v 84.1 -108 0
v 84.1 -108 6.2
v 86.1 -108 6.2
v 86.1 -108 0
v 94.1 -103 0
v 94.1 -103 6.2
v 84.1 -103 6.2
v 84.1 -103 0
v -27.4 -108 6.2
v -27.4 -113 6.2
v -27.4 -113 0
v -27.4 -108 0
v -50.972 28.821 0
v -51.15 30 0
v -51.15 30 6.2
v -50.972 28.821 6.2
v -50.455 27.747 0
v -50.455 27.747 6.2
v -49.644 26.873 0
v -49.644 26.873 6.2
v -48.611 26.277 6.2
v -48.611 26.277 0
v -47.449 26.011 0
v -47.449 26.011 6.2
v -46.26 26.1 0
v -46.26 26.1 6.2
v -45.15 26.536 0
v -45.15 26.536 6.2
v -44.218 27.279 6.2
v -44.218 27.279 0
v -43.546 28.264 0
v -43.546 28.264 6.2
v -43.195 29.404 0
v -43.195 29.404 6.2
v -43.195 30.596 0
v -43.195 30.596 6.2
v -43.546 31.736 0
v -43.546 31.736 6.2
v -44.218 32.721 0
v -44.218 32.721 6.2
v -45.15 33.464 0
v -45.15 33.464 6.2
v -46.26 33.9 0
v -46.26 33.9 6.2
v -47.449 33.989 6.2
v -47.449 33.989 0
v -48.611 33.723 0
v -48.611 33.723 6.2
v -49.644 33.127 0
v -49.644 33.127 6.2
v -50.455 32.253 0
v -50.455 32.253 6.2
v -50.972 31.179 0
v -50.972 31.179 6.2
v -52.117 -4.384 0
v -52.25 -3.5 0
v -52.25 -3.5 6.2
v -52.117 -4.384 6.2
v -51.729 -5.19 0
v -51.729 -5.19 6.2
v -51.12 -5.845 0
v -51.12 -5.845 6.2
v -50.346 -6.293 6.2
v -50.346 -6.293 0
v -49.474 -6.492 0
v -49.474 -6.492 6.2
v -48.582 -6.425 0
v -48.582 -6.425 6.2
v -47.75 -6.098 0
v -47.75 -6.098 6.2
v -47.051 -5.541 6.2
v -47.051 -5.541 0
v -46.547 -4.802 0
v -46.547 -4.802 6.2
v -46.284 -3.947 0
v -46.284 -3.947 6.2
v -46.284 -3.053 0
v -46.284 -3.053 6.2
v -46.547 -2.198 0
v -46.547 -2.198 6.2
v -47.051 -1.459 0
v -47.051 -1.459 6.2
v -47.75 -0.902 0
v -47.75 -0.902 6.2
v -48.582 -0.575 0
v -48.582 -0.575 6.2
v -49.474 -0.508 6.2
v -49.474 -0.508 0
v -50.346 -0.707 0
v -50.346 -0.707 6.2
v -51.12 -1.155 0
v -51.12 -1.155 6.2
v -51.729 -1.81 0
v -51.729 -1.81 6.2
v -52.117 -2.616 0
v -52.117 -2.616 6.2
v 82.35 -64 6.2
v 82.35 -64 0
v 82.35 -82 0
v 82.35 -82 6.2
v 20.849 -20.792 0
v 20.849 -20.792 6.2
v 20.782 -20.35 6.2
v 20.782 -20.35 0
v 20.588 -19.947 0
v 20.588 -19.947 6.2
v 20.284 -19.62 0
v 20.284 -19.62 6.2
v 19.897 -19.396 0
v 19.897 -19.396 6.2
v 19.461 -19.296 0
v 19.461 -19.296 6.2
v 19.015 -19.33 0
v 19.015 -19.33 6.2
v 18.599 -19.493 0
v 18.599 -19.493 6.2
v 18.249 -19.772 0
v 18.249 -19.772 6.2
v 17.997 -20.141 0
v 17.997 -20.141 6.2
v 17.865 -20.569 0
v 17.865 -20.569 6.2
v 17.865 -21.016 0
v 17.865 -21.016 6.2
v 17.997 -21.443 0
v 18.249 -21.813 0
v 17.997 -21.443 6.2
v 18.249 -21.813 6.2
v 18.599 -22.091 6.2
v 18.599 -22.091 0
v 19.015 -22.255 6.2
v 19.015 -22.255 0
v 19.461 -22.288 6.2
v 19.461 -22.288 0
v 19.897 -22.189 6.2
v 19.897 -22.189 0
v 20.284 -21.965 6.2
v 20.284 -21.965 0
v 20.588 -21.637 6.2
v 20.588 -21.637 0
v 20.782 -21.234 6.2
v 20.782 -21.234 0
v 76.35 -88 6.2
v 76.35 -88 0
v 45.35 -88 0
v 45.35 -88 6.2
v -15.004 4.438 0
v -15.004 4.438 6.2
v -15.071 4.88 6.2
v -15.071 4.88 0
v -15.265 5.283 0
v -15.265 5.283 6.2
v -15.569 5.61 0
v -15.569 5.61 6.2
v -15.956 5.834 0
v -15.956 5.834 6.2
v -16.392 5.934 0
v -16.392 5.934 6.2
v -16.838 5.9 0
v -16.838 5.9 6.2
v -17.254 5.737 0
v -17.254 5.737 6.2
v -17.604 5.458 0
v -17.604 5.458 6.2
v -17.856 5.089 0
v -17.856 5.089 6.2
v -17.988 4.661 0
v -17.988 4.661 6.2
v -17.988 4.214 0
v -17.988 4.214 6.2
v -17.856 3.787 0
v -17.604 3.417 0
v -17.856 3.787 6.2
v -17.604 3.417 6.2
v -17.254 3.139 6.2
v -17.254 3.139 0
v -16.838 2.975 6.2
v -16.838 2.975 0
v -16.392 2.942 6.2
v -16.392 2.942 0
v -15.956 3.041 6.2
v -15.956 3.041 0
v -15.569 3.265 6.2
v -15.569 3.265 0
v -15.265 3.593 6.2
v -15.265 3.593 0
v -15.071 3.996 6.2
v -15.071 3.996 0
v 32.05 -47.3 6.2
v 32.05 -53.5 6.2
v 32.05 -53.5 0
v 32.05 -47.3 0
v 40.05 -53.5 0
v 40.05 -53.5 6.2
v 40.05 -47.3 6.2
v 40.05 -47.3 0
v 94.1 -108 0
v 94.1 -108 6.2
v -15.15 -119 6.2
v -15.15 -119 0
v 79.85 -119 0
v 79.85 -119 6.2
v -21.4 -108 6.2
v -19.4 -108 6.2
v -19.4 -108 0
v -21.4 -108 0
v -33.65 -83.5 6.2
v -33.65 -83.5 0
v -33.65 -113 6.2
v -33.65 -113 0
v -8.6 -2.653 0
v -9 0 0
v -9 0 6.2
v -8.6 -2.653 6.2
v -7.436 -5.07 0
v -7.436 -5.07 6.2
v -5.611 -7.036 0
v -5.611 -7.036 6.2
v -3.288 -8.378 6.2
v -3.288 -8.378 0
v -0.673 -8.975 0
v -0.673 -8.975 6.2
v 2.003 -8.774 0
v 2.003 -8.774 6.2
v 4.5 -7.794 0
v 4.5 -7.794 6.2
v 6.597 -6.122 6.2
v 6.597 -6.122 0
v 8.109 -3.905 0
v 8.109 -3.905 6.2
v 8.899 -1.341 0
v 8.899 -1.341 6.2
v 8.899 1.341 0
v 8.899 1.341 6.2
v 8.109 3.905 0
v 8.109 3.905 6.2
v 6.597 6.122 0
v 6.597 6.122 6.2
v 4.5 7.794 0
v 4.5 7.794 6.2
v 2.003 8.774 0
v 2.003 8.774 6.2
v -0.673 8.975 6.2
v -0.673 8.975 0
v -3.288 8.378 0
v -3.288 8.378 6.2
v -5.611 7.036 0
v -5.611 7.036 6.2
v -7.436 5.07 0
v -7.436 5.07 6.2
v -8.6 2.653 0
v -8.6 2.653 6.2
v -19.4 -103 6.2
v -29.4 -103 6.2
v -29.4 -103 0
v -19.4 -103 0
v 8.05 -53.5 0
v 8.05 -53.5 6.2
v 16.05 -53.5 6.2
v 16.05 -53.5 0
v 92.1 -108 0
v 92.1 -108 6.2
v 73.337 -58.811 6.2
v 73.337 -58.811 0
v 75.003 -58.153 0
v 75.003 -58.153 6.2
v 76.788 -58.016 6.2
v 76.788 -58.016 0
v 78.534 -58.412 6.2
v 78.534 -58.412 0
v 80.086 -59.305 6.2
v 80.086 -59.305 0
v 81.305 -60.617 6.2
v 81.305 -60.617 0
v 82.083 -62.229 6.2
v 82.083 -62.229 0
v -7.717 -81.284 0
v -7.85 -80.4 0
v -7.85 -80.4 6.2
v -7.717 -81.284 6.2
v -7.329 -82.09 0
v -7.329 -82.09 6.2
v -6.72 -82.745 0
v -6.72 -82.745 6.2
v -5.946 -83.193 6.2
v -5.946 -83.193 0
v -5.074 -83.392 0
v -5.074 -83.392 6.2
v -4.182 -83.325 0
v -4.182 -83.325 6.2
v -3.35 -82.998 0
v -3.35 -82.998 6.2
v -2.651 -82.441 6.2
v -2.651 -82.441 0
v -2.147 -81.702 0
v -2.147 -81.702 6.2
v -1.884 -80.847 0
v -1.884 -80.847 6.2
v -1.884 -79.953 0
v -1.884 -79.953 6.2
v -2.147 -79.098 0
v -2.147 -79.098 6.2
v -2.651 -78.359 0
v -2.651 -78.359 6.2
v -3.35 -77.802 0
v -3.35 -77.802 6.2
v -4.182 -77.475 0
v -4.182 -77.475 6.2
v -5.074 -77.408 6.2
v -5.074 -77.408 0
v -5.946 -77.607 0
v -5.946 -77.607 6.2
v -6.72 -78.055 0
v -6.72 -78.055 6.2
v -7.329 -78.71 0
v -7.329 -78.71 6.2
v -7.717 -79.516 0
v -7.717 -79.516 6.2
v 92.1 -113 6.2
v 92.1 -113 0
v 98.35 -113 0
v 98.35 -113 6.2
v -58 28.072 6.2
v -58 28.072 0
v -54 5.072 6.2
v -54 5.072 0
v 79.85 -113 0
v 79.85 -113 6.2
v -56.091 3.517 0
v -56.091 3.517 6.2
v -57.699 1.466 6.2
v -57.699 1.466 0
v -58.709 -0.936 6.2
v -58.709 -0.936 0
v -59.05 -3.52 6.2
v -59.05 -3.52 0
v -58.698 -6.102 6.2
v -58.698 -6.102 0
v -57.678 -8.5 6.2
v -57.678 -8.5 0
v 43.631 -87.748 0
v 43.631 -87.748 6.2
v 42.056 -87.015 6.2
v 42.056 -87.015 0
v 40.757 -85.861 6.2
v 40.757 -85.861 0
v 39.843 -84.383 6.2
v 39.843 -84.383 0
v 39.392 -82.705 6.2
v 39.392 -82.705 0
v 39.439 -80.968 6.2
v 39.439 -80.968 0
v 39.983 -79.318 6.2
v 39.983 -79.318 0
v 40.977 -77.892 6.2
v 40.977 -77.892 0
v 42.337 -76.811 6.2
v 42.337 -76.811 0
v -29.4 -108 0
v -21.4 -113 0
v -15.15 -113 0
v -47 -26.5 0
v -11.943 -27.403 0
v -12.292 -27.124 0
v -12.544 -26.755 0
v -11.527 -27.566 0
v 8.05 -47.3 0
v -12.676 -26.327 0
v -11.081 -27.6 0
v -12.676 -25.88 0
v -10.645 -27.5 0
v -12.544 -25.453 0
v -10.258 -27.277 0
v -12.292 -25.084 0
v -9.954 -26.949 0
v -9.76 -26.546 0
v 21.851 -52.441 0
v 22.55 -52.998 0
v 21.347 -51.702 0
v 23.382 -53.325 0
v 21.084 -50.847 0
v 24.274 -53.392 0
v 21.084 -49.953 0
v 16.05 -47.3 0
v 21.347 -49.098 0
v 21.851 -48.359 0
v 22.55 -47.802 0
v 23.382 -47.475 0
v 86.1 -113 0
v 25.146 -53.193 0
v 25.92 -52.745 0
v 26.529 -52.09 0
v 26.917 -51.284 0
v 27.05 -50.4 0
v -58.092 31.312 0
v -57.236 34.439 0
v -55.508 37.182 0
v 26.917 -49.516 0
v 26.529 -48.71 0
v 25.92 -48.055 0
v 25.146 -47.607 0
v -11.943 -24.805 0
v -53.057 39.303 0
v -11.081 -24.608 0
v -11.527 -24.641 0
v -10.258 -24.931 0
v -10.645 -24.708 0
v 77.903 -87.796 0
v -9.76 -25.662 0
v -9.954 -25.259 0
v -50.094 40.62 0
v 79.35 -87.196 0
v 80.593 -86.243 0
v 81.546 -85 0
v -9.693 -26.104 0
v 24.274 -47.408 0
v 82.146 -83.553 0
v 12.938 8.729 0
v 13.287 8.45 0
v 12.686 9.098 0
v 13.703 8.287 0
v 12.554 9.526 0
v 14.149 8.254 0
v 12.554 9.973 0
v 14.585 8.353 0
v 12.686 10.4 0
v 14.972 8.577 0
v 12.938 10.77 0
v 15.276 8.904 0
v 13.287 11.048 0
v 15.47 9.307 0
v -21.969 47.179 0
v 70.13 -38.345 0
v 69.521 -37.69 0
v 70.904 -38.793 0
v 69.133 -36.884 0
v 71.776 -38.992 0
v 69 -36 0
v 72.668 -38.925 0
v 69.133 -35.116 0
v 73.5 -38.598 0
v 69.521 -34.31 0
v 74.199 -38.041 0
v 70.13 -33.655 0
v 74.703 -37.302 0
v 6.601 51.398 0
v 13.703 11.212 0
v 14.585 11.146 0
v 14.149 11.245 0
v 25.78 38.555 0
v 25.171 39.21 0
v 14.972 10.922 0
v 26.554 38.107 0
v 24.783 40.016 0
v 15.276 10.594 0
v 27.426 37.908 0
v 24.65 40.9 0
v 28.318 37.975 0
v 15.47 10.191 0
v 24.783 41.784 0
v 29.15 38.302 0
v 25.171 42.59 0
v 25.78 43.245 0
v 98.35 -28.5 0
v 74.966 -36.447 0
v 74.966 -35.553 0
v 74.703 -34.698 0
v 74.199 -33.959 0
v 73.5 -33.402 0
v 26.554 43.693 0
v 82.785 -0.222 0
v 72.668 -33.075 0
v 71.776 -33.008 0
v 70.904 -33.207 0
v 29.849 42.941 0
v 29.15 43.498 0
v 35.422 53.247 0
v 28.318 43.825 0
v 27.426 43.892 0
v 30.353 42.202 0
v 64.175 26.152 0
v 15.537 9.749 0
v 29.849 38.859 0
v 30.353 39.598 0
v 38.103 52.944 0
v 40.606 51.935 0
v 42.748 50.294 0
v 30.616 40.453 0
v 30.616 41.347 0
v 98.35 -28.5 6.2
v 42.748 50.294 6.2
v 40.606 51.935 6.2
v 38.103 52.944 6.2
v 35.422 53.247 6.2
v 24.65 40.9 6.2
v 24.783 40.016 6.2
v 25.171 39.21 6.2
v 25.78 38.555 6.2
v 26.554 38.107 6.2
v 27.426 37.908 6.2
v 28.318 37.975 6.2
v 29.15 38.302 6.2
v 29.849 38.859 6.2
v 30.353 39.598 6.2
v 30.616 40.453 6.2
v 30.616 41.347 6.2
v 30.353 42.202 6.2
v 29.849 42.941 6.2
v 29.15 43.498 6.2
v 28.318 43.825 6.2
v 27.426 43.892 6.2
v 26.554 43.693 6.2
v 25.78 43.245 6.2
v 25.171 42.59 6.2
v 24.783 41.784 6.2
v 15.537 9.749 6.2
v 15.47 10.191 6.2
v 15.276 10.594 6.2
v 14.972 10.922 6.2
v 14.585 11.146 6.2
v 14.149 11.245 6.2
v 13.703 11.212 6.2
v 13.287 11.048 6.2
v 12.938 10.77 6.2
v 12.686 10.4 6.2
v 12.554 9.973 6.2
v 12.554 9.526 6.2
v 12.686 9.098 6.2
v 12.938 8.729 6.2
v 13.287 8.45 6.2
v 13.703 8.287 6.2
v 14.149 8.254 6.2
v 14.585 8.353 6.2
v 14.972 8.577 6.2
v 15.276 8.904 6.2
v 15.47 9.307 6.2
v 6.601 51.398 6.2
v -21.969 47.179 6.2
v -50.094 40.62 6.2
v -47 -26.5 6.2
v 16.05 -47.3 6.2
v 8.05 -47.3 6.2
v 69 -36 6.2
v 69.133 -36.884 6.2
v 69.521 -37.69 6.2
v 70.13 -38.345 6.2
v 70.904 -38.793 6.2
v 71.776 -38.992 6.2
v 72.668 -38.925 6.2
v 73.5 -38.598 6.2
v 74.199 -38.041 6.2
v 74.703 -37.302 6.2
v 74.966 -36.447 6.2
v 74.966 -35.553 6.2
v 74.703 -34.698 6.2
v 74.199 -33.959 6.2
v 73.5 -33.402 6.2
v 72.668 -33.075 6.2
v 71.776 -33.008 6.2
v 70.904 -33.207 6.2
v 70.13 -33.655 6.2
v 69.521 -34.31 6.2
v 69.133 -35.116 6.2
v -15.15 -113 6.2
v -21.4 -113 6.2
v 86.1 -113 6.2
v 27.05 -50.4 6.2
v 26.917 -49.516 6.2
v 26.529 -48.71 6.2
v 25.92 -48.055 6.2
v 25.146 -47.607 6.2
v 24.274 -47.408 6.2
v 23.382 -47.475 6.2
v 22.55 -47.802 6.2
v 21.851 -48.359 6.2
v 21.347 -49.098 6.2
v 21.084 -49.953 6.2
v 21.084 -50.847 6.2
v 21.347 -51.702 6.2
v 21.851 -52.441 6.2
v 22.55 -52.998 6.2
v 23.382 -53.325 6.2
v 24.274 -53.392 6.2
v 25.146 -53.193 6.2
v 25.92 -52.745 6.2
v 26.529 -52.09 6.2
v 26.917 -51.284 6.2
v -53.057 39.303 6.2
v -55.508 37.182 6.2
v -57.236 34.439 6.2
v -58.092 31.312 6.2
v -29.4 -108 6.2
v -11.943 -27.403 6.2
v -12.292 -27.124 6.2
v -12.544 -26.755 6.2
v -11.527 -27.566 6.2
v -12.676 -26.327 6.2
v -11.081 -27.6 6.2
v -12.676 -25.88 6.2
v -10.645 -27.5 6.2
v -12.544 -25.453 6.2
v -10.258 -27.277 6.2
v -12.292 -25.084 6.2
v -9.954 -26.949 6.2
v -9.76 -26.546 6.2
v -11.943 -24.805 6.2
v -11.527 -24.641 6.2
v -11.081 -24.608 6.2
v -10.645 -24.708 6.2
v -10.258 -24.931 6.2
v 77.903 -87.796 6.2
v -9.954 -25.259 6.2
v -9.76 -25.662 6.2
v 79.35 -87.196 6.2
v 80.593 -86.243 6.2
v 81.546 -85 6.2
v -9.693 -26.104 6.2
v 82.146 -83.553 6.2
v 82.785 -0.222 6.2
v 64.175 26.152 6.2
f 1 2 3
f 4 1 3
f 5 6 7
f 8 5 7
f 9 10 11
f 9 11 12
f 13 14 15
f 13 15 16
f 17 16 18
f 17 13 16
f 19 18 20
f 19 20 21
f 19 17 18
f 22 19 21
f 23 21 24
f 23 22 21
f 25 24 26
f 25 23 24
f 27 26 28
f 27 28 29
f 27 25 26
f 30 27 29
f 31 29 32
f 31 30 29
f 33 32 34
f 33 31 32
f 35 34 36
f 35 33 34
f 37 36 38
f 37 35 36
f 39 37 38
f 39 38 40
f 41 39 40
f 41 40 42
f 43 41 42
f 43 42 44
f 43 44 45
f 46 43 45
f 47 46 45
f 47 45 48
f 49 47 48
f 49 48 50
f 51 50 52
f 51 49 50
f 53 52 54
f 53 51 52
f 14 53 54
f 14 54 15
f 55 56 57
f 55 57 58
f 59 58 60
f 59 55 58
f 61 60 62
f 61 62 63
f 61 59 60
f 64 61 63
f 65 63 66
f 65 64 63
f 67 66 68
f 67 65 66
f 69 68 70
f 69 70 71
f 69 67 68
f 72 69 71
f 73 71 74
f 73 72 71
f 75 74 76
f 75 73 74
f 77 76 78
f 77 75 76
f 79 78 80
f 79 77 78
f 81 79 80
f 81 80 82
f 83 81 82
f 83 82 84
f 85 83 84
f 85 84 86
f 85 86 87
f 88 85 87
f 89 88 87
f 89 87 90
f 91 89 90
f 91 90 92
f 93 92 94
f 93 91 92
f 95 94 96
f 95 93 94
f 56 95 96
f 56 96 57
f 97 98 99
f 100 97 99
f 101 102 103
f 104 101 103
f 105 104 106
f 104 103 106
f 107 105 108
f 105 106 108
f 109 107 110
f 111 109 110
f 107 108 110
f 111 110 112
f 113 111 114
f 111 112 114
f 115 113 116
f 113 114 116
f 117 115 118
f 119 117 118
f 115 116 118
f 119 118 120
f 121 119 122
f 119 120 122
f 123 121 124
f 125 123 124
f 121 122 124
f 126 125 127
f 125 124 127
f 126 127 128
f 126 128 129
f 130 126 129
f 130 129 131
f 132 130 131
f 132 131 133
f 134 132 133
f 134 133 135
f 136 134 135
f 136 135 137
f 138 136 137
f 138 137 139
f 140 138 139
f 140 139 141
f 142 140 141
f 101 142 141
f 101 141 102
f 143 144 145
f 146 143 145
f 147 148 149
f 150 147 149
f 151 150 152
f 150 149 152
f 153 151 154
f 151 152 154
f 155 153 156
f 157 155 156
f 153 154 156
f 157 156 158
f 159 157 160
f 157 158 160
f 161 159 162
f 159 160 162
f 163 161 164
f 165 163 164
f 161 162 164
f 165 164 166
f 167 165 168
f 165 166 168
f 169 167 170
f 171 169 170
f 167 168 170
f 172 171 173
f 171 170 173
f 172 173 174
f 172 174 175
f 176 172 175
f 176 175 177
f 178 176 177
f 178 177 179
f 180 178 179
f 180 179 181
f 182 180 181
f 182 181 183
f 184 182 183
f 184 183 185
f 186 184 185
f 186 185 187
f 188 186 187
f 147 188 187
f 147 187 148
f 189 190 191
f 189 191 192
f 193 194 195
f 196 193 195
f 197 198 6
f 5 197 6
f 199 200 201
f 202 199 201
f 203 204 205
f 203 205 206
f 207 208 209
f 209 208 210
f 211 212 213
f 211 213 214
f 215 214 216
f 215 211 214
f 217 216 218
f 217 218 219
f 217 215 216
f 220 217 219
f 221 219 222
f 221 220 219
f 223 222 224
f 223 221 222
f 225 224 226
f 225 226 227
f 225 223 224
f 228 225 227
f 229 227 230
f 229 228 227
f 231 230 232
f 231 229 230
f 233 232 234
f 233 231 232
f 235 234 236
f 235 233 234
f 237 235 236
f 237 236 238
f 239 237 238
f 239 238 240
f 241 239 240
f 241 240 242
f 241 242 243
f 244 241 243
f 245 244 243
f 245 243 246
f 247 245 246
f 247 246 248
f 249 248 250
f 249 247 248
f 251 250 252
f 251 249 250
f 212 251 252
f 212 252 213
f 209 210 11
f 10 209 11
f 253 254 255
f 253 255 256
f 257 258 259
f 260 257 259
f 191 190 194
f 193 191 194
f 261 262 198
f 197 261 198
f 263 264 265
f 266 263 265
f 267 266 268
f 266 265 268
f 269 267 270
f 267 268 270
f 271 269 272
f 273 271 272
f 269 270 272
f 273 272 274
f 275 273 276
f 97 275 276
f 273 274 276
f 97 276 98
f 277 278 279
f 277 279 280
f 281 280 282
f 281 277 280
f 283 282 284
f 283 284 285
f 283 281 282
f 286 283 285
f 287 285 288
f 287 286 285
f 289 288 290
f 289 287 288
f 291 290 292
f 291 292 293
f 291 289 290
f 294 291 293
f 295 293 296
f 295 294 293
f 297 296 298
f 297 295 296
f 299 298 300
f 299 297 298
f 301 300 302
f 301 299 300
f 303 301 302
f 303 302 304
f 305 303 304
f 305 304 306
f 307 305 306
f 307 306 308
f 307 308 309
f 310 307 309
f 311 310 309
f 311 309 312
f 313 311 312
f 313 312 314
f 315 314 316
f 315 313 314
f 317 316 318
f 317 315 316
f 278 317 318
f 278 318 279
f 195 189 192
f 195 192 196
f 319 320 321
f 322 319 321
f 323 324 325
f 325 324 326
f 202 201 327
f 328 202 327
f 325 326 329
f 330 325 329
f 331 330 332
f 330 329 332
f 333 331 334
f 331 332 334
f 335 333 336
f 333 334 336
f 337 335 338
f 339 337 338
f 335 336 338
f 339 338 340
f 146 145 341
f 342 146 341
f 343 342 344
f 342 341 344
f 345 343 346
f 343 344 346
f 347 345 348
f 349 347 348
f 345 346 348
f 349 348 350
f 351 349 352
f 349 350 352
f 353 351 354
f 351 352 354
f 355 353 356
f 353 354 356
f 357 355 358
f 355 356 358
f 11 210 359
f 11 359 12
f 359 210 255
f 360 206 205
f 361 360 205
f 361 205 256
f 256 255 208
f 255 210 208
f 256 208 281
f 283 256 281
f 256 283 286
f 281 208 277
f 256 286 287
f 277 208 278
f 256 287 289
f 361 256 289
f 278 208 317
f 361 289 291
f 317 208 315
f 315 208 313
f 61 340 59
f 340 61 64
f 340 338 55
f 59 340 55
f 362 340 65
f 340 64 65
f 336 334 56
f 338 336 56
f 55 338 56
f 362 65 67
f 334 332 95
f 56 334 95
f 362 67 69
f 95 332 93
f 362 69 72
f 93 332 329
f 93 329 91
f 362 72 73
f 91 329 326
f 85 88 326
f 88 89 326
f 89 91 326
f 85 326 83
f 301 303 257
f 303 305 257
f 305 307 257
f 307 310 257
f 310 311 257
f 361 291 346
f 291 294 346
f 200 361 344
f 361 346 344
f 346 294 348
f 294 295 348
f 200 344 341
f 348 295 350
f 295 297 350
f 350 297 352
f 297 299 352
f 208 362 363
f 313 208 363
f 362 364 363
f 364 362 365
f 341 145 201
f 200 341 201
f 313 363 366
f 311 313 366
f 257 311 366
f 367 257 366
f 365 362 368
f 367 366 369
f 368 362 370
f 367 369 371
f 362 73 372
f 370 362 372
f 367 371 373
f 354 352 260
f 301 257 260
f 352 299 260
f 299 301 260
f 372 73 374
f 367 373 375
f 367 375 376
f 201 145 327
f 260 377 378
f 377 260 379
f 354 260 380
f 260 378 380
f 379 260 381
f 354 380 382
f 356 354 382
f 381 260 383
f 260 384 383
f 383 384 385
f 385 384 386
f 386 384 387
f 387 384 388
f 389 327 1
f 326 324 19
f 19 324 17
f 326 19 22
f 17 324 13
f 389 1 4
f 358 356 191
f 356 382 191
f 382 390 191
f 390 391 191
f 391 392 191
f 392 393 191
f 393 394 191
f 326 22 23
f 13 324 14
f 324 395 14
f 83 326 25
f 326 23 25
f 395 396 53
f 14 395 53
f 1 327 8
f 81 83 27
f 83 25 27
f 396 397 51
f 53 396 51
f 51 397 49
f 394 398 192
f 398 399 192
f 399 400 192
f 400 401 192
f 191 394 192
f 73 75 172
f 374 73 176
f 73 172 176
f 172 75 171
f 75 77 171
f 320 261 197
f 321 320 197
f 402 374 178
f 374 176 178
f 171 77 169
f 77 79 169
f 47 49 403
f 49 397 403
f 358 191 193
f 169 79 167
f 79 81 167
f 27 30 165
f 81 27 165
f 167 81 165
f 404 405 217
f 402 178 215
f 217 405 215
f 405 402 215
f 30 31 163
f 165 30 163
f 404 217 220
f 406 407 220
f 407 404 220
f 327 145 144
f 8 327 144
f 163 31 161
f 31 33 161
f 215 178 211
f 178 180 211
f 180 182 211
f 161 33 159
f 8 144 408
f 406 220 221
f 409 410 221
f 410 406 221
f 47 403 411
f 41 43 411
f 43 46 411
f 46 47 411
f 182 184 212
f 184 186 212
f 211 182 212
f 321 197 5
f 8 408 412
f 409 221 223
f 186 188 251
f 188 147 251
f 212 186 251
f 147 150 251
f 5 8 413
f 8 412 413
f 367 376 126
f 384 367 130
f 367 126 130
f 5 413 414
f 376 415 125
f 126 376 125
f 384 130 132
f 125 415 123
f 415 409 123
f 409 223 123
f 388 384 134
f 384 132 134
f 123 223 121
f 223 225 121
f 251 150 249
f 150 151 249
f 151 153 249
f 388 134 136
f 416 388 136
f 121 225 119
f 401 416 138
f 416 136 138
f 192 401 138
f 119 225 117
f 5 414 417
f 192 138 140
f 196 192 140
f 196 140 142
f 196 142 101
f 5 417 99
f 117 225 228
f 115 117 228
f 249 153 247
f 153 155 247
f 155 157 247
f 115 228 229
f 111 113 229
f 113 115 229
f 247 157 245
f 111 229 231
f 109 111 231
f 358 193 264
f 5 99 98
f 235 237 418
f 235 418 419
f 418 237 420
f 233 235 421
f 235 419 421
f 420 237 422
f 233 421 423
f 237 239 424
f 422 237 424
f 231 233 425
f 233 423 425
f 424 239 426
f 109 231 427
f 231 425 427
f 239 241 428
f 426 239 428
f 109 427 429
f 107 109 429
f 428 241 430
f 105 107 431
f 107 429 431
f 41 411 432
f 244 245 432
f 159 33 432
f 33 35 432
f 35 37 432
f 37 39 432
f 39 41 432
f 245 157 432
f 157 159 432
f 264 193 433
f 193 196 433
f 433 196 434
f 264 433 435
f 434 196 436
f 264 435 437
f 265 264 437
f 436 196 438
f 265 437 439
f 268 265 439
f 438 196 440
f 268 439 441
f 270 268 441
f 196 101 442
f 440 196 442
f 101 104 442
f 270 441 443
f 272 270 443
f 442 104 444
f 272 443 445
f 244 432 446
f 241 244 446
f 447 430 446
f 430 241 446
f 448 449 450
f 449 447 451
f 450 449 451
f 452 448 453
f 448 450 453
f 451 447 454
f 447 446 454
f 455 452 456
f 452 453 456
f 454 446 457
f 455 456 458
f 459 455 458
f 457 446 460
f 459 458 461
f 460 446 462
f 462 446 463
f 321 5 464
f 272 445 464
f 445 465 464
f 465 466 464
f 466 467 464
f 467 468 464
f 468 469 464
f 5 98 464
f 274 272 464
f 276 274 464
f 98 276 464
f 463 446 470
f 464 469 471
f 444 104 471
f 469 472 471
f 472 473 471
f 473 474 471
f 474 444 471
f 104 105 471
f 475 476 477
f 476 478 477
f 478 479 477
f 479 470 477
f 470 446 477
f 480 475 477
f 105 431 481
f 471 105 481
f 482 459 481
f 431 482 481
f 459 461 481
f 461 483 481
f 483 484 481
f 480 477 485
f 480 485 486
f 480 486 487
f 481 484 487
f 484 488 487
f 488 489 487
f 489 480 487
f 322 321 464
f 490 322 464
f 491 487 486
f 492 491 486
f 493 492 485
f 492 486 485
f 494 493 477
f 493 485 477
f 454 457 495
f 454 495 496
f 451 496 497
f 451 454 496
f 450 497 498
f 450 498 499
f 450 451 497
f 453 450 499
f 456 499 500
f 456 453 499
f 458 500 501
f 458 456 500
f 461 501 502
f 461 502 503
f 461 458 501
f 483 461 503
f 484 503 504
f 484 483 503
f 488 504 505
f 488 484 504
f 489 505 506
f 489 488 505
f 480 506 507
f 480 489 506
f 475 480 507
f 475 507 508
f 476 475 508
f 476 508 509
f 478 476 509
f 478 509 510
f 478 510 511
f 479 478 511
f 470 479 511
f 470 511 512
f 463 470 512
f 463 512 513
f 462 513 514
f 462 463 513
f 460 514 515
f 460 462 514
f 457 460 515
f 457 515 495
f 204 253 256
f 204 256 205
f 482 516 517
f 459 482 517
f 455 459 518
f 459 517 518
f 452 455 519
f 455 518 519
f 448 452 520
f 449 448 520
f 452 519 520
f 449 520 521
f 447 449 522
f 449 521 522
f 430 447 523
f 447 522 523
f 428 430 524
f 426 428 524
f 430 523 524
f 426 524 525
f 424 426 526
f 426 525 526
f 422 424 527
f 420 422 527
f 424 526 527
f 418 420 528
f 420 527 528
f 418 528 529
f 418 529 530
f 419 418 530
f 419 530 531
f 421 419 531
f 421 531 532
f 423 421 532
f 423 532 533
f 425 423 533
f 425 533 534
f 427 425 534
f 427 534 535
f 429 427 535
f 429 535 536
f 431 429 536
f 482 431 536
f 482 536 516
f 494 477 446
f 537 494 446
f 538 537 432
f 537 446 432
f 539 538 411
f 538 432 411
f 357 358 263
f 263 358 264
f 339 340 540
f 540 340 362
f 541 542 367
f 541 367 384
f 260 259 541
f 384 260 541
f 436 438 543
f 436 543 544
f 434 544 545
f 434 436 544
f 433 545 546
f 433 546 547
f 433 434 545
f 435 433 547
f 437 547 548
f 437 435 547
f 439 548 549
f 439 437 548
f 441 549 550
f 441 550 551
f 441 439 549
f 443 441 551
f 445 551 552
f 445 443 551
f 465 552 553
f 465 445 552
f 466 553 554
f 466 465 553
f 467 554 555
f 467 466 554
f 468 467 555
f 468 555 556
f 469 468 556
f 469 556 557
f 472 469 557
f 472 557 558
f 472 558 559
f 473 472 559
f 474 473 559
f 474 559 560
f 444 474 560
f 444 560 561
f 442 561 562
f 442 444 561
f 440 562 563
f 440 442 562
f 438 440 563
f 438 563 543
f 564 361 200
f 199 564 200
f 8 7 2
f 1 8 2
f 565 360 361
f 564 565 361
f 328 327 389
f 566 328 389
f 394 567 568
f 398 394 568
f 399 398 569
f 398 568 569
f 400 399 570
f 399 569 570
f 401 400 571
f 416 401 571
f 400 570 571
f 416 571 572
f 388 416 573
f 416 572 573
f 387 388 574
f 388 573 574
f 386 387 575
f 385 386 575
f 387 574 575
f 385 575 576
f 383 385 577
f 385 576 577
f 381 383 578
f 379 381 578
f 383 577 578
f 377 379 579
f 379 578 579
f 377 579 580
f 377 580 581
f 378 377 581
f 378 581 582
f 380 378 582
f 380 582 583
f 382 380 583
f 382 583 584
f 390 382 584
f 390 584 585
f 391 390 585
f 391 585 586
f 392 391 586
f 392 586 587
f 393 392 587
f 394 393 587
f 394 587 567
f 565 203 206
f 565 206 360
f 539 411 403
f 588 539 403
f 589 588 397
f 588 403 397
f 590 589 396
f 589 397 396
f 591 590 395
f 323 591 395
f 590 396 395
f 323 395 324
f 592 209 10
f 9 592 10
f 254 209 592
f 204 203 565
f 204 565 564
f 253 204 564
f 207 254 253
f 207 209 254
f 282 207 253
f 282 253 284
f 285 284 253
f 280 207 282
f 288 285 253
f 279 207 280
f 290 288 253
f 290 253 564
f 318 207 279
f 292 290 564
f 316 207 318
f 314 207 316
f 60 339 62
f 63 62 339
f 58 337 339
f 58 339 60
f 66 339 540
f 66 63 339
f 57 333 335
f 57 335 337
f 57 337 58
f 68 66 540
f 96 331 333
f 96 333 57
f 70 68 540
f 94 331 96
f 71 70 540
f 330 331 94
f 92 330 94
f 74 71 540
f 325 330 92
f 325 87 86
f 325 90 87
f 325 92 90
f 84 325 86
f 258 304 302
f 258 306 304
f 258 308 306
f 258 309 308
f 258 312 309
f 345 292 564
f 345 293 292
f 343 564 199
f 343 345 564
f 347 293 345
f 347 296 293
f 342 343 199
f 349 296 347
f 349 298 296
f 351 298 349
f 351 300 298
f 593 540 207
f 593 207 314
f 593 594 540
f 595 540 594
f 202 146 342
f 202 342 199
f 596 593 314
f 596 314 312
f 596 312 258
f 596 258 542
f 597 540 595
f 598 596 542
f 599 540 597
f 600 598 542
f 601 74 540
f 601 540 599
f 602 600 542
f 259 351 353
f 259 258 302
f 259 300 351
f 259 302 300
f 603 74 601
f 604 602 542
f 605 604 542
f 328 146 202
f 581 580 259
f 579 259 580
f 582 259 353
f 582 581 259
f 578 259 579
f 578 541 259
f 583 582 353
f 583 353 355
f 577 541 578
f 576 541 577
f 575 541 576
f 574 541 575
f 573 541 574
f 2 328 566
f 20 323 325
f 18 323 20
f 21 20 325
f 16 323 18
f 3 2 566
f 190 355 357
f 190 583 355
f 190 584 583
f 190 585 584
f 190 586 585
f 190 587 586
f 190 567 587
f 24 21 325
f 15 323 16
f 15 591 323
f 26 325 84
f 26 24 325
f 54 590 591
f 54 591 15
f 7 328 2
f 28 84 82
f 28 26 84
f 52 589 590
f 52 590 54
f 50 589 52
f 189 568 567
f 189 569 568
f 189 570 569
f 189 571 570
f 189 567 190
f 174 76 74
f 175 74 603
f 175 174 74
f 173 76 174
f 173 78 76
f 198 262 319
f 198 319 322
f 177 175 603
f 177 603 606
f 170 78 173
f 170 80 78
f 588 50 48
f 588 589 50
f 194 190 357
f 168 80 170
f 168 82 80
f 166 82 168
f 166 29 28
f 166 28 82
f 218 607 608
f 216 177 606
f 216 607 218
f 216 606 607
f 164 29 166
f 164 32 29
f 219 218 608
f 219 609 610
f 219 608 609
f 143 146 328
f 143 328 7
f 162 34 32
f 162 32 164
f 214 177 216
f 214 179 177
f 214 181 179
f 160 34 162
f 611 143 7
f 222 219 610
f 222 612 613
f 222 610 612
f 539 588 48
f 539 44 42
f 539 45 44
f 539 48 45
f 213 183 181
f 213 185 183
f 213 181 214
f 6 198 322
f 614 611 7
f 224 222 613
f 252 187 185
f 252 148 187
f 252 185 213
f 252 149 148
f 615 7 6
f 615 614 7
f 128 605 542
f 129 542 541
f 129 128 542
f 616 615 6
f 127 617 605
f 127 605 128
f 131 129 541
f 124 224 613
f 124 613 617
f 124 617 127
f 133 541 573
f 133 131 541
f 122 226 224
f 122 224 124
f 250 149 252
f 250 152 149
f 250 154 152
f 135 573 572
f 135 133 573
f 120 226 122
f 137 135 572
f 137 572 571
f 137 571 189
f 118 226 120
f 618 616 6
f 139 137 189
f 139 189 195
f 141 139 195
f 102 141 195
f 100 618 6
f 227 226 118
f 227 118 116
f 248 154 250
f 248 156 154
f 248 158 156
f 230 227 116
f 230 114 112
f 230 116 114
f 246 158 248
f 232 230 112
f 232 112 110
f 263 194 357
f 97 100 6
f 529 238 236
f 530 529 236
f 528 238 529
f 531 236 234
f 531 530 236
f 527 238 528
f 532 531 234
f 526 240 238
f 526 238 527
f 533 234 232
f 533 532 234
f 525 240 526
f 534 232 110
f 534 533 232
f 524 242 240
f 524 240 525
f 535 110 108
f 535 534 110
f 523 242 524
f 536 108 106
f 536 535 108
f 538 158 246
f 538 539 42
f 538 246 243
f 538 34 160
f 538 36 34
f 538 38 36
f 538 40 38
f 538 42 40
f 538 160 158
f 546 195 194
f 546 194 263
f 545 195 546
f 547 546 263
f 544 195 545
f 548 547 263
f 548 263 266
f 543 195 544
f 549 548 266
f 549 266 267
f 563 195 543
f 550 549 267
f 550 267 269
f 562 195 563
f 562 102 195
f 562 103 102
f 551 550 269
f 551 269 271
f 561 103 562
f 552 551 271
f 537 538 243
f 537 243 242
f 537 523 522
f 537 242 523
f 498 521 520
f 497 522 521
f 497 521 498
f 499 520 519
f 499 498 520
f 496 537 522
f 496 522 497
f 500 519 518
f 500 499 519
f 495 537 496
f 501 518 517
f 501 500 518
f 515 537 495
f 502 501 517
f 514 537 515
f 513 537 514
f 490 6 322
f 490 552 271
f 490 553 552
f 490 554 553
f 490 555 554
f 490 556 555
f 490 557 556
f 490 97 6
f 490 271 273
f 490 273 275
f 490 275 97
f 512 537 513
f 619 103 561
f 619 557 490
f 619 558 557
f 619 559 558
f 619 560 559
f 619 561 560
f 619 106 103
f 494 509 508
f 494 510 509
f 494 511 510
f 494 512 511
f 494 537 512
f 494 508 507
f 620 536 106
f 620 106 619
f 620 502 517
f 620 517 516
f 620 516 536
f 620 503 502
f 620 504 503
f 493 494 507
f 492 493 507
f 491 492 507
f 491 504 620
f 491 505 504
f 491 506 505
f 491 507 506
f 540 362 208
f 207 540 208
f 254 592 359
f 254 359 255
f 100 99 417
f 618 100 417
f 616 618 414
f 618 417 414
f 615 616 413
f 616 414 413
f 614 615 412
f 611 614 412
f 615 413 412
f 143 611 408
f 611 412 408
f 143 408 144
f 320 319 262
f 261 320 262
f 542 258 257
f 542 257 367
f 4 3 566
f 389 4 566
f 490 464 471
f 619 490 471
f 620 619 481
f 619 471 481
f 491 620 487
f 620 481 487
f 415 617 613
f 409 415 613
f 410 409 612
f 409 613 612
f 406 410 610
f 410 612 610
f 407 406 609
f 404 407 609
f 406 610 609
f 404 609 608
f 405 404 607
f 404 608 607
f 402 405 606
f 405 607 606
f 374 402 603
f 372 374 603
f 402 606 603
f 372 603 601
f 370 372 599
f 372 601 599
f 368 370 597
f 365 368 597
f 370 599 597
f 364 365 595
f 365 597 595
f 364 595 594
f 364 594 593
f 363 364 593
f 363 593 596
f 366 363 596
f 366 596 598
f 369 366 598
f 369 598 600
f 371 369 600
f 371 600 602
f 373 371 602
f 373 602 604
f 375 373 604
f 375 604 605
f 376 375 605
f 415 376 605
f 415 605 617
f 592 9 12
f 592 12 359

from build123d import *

# Parameters (mm, degrees)
SKETCH1_R           = 4
SKETCH1_R_2         = 3
SKETCH1_R_3         = 9
BOSS_EXTRUDE1_DEPTH = 6.2
CUT_EXTRUDE1_REACH  = 156.506
SKETCH2_R           = 1.5
CUT_EXTRUDE2_REACH  = 156.506
CUT_EXTRUDE3_REACH  = 156.506
SKETCH5_R           = 3
SKETCH5_W           = 8
SKETCH5_H           = 6.2


with BuildPart() as part:
    # Sketch1 → Boss-Extrude1 (new body)
    with BuildSketch(Plane.XY):
        with BuildLine():
            Line((-57.678304402, -8.5), (-47, -26.5))
            Line((-47, -26.5), (-33.65, -83.5))
            Line((-33.65, -83.5), (-33.65, -113))
            Line((-33.65, -113), (-15.15, -113))
            Line((-15.15, -113), (-15.15, -119))
            Line((-15.15, -119), (79.85, -119))
            Line((79.85, -119), (79.85, -113))
            Line((79.85, -113), (98.35, -113))
            Line((98.35, -113), (98.35, -28.5))
            ThreePointArc((98.35, -28.5), (73.847295802, 13.224376921), (42.748141943, 50.293889619))
            ThreePointArc((42.748141943, 50.293889619), (39.389057397, 52.524667098), (35.422008956, 53.247400666))
            ThreePointArc((35.422008956, 53.247400666), (-7.727235636, 49.583712908), (-50.093777716, 40.619560464))
            ThreePointArc((-50.093777716, 40.619560464), (-56.473591535, 35.874651698), (-58, 28.071686829))
            Line((-58, 28.071686829), (-54, 5.071686829))
            ThreePointArc((-54, 5.071686829), (-58.708572703, -0.936463864), (-57.678304402, -8.5))
        make_face()
        with Locations(Location((-47.15, 30, 0), (0, 0, 180))):
            Circle(SKETCH1_R, mode=Mode.SUBTRACT)
        with Locations(Location((27.65, 40.9, 0), (0, 0, 180))):
            Circle(SKETCH1_R_2, mode=Mode.SUBTRACT)
        with Locations(Location((-4.85, -80.4, 0), (0, 0, 180))):
            Circle(SKETCH1_R_2, mode=Mode.SUBTRACT)
        with Locations(Location((-49.25, -3.5, 0), (0, 0, 180))):
            Circle(SKETCH1_R_2, mode=Mode.SUBTRACT)
        with Locations(Location((72, -36, 0), (0, 0, 180))):
            Circle(SKETCH1_R_2, mode=Mode.SUBTRACT)
        with Locations(Location((0, 0, 0), (0, 0, 180))):
            Circle(SKETCH1_R_3, mode=Mode.SUBTRACT)
        with BuildLine():
            Line((82.35, -64), (82.35, -82))
            ThreePointArc((82.35, -82), (80.592640687, -86.242640687), (76.35, -88))
            Line((76.35, -88), (45.35, -88))
            ThreePointArc((45.35, -88), (39.556365472, -83.560063768), (42.337186896, -76.81126632))
            Line((42.337186896, -76.81126632), (73.337186896, -58.81126632))
            ThreePointArc((73.337186896, -58.81126632), (79.343586593, -58.800150068), (82.35, -64))
        make_face(mode=Mode.SUBTRACT)
    extrude(amount=BOSS_EXTRUDE1_DEPTH)

    # Sketch2 → Cut-Extrude1 (cut, up to next)
    with BuildSketch(Plane.XY.offset(6.2), mode=Mode.PRIVATE) as cut_extrude1_sk1:
        with Locations((19.348702159, -20.792251556)):
            Circle(SKETCH2_R)
    cut_extrude1_tool1 = extrude(cut_extrude1_sk1.sketch, amount=-CUT_EXTRUDE1_REACH, mode=Mode.PRIVATE) & part.part
    # Sketch2 → Cut-Extrude1 (cut, up to next)
    with BuildSketch(Plane.XY.offset(6.2), mode=Mode.PRIVATE) as cut_extrude1_sk2:
        with Locations((-11.192862241, -26.103827973)):
            Circle(SKETCH2_R)
    cut_extrude1_tool2 = extrude(cut_extrude1_sk2.sketch, amount=-CUT_EXTRUDE1_REACH, mode=Mode.PRIVATE) & part.part
    # Sketch2 → Cut-Extrude1 (cut, up to next)
    with BuildSketch(Plane.XY.offset(6.2), mode=Mode.PRIVATE) as cut_extrude1_sk3:
        with Locations((-16.504438658, 4.437736426)):
            Circle(SKETCH2_R)
    cut_extrude1_tool3 = extrude(cut_extrude1_sk3.sketch, amount=-CUT_EXTRUDE1_REACH, mode=Mode.PRIVATE) & part.part
    # Sketch2 → Cut-Extrude1 (cut, up to next)
    with BuildSketch(Plane.XY.offset(6.2), mode=Mode.PRIVATE) as cut_extrude1_sk4:
        with Locations((14.037125741, 9.749312843)):
            Circle(SKETCH2_R)
    cut_extrude1_tool4 = extrude(cut_extrude1_sk4.sketch, amount=-CUT_EXTRUDE1_REACH, mode=Mode.PRIVATE) & part.part
    add(cut_extrude1_tool1.solids().sort_by_distance((19.348702, -20.792252, 6.2))[0], mode=Mode.SUBTRACT)
    add(cut_extrude1_tool2.solids().sort_by_distance((-11.192862, -26.103828, 6.2))[0], mode=Mode.SUBTRACT)
    add(cut_extrude1_tool3.solids().sort_by_distance((-16.504439, 4.437736, 6.2))[0], mode=Mode.SUBTRACT)
    add(cut_extrude1_tool4.solids().sort_by_distance((14.037126, 9.749313, 6.2))[0], mode=Mode.SUBTRACT)

    # Sketch3 → Cut-Extrude2 (cut, up to next)
    with BuildSketch(Plane.XY.offset(6.2), mode=Mode.PRIVATE) as cut_extrude2_sk1:
        Polygon((-29.4, -103), (-19.4, -103), (-19.4, -108), (-21.4, -108), (-21.4, -113), (-27.4, -113), (-27.4, -108), (-29.4, -108), align=None)
    cut_extrude2_tool1 = extrude(cut_extrude2_sk1.sketch, amount=-CUT_EXTRUDE2_REACH, mode=Mode.PRIVATE) & part.part
    # Sketch3 → Cut-Extrude2 (cut, up to next)
    with BuildSketch(Plane.XY.offset(6.2), mode=Mode.PRIVATE) as cut_extrude2_sk2:
        Polygon((86.1, -108), (86.1, -113), (92.1, -113), (92.1, -108), (94.1, -108), (94.1, -103), (84.1, -103), (84.1, -108), align=None)
    cut_extrude2_tool2 = extrude(cut_extrude2_sk2.sketch, amount=-CUT_EXTRUDE2_REACH, mode=Mode.PRIVATE) & part.part
    add(cut_extrude2_tool1.solids().sort_by_distance((-24.4, -107.375, 6.2))[0], mode=Mode.SUBTRACT)
    add(cut_extrude2_tool2.solids().sort_by_distance((89.1, -107.375, 6.2))[0], mode=Mode.SUBTRACT)

    # Sketch5 → Cut-Extrude3 (cut, up to next)
    with BuildSketch(Plane.XY.offset(6.2), mode=Mode.PRIVATE) as cut_extrude3_sk1:
        with Locations((24.05, -50.4)):
            Circle(SKETCH5_R)
    cut_extrude3_tool1 = extrude(cut_extrude3_sk1.sketch, amount=-CUT_EXTRUDE3_REACH, mode=Mode.PRIVATE) & part.part
    # Sketch5 → Cut-Extrude3 (cut, up to next)
    with BuildSketch(Plane.XY.offset(6.2), mode=Mode.PRIVATE) as cut_extrude3_sk2:
        with Locations((36.05, -50.4)):
            Rectangle(SKETCH5_W, SKETCH5_H)
    cut_extrude3_tool2 = extrude(cut_extrude3_sk2.sketch, amount=-CUT_EXTRUDE3_REACH, mode=Mode.PRIVATE) & part.part
    # Sketch5 → Cut-Extrude3 (cut, up to next)
    with BuildSketch(Plane.XY.offset(6.2), mode=Mode.PRIVATE) as cut_extrude3_sk3:
        with Locations((12.05, -50.4)):
            Rectangle(SKETCH5_W, SKETCH5_H)
    cut_extrude3_tool3 = extrude(cut_extrude3_sk3.sketch, amount=-CUT_EXTRUDE3_REACH, mode=Mode.PRIVATE) & part.part
    add(cut_extrude3_tool1.solids().sort_by_distance((24.05, -50.4, 6.2))[0], mode=Mode.SUBTRACT)
    add(cut_extrude3_tool2.solids().sort_by_distance((36.05, -50.4, 6.2))[0], mode=Mode.SUBTRACT)
    add(cut_extrude3_tool3.solids().sort_by_distance((12.05, -50.4, 6.2))[0], mode=Mode.SUBTRACT)


solid = part.part
